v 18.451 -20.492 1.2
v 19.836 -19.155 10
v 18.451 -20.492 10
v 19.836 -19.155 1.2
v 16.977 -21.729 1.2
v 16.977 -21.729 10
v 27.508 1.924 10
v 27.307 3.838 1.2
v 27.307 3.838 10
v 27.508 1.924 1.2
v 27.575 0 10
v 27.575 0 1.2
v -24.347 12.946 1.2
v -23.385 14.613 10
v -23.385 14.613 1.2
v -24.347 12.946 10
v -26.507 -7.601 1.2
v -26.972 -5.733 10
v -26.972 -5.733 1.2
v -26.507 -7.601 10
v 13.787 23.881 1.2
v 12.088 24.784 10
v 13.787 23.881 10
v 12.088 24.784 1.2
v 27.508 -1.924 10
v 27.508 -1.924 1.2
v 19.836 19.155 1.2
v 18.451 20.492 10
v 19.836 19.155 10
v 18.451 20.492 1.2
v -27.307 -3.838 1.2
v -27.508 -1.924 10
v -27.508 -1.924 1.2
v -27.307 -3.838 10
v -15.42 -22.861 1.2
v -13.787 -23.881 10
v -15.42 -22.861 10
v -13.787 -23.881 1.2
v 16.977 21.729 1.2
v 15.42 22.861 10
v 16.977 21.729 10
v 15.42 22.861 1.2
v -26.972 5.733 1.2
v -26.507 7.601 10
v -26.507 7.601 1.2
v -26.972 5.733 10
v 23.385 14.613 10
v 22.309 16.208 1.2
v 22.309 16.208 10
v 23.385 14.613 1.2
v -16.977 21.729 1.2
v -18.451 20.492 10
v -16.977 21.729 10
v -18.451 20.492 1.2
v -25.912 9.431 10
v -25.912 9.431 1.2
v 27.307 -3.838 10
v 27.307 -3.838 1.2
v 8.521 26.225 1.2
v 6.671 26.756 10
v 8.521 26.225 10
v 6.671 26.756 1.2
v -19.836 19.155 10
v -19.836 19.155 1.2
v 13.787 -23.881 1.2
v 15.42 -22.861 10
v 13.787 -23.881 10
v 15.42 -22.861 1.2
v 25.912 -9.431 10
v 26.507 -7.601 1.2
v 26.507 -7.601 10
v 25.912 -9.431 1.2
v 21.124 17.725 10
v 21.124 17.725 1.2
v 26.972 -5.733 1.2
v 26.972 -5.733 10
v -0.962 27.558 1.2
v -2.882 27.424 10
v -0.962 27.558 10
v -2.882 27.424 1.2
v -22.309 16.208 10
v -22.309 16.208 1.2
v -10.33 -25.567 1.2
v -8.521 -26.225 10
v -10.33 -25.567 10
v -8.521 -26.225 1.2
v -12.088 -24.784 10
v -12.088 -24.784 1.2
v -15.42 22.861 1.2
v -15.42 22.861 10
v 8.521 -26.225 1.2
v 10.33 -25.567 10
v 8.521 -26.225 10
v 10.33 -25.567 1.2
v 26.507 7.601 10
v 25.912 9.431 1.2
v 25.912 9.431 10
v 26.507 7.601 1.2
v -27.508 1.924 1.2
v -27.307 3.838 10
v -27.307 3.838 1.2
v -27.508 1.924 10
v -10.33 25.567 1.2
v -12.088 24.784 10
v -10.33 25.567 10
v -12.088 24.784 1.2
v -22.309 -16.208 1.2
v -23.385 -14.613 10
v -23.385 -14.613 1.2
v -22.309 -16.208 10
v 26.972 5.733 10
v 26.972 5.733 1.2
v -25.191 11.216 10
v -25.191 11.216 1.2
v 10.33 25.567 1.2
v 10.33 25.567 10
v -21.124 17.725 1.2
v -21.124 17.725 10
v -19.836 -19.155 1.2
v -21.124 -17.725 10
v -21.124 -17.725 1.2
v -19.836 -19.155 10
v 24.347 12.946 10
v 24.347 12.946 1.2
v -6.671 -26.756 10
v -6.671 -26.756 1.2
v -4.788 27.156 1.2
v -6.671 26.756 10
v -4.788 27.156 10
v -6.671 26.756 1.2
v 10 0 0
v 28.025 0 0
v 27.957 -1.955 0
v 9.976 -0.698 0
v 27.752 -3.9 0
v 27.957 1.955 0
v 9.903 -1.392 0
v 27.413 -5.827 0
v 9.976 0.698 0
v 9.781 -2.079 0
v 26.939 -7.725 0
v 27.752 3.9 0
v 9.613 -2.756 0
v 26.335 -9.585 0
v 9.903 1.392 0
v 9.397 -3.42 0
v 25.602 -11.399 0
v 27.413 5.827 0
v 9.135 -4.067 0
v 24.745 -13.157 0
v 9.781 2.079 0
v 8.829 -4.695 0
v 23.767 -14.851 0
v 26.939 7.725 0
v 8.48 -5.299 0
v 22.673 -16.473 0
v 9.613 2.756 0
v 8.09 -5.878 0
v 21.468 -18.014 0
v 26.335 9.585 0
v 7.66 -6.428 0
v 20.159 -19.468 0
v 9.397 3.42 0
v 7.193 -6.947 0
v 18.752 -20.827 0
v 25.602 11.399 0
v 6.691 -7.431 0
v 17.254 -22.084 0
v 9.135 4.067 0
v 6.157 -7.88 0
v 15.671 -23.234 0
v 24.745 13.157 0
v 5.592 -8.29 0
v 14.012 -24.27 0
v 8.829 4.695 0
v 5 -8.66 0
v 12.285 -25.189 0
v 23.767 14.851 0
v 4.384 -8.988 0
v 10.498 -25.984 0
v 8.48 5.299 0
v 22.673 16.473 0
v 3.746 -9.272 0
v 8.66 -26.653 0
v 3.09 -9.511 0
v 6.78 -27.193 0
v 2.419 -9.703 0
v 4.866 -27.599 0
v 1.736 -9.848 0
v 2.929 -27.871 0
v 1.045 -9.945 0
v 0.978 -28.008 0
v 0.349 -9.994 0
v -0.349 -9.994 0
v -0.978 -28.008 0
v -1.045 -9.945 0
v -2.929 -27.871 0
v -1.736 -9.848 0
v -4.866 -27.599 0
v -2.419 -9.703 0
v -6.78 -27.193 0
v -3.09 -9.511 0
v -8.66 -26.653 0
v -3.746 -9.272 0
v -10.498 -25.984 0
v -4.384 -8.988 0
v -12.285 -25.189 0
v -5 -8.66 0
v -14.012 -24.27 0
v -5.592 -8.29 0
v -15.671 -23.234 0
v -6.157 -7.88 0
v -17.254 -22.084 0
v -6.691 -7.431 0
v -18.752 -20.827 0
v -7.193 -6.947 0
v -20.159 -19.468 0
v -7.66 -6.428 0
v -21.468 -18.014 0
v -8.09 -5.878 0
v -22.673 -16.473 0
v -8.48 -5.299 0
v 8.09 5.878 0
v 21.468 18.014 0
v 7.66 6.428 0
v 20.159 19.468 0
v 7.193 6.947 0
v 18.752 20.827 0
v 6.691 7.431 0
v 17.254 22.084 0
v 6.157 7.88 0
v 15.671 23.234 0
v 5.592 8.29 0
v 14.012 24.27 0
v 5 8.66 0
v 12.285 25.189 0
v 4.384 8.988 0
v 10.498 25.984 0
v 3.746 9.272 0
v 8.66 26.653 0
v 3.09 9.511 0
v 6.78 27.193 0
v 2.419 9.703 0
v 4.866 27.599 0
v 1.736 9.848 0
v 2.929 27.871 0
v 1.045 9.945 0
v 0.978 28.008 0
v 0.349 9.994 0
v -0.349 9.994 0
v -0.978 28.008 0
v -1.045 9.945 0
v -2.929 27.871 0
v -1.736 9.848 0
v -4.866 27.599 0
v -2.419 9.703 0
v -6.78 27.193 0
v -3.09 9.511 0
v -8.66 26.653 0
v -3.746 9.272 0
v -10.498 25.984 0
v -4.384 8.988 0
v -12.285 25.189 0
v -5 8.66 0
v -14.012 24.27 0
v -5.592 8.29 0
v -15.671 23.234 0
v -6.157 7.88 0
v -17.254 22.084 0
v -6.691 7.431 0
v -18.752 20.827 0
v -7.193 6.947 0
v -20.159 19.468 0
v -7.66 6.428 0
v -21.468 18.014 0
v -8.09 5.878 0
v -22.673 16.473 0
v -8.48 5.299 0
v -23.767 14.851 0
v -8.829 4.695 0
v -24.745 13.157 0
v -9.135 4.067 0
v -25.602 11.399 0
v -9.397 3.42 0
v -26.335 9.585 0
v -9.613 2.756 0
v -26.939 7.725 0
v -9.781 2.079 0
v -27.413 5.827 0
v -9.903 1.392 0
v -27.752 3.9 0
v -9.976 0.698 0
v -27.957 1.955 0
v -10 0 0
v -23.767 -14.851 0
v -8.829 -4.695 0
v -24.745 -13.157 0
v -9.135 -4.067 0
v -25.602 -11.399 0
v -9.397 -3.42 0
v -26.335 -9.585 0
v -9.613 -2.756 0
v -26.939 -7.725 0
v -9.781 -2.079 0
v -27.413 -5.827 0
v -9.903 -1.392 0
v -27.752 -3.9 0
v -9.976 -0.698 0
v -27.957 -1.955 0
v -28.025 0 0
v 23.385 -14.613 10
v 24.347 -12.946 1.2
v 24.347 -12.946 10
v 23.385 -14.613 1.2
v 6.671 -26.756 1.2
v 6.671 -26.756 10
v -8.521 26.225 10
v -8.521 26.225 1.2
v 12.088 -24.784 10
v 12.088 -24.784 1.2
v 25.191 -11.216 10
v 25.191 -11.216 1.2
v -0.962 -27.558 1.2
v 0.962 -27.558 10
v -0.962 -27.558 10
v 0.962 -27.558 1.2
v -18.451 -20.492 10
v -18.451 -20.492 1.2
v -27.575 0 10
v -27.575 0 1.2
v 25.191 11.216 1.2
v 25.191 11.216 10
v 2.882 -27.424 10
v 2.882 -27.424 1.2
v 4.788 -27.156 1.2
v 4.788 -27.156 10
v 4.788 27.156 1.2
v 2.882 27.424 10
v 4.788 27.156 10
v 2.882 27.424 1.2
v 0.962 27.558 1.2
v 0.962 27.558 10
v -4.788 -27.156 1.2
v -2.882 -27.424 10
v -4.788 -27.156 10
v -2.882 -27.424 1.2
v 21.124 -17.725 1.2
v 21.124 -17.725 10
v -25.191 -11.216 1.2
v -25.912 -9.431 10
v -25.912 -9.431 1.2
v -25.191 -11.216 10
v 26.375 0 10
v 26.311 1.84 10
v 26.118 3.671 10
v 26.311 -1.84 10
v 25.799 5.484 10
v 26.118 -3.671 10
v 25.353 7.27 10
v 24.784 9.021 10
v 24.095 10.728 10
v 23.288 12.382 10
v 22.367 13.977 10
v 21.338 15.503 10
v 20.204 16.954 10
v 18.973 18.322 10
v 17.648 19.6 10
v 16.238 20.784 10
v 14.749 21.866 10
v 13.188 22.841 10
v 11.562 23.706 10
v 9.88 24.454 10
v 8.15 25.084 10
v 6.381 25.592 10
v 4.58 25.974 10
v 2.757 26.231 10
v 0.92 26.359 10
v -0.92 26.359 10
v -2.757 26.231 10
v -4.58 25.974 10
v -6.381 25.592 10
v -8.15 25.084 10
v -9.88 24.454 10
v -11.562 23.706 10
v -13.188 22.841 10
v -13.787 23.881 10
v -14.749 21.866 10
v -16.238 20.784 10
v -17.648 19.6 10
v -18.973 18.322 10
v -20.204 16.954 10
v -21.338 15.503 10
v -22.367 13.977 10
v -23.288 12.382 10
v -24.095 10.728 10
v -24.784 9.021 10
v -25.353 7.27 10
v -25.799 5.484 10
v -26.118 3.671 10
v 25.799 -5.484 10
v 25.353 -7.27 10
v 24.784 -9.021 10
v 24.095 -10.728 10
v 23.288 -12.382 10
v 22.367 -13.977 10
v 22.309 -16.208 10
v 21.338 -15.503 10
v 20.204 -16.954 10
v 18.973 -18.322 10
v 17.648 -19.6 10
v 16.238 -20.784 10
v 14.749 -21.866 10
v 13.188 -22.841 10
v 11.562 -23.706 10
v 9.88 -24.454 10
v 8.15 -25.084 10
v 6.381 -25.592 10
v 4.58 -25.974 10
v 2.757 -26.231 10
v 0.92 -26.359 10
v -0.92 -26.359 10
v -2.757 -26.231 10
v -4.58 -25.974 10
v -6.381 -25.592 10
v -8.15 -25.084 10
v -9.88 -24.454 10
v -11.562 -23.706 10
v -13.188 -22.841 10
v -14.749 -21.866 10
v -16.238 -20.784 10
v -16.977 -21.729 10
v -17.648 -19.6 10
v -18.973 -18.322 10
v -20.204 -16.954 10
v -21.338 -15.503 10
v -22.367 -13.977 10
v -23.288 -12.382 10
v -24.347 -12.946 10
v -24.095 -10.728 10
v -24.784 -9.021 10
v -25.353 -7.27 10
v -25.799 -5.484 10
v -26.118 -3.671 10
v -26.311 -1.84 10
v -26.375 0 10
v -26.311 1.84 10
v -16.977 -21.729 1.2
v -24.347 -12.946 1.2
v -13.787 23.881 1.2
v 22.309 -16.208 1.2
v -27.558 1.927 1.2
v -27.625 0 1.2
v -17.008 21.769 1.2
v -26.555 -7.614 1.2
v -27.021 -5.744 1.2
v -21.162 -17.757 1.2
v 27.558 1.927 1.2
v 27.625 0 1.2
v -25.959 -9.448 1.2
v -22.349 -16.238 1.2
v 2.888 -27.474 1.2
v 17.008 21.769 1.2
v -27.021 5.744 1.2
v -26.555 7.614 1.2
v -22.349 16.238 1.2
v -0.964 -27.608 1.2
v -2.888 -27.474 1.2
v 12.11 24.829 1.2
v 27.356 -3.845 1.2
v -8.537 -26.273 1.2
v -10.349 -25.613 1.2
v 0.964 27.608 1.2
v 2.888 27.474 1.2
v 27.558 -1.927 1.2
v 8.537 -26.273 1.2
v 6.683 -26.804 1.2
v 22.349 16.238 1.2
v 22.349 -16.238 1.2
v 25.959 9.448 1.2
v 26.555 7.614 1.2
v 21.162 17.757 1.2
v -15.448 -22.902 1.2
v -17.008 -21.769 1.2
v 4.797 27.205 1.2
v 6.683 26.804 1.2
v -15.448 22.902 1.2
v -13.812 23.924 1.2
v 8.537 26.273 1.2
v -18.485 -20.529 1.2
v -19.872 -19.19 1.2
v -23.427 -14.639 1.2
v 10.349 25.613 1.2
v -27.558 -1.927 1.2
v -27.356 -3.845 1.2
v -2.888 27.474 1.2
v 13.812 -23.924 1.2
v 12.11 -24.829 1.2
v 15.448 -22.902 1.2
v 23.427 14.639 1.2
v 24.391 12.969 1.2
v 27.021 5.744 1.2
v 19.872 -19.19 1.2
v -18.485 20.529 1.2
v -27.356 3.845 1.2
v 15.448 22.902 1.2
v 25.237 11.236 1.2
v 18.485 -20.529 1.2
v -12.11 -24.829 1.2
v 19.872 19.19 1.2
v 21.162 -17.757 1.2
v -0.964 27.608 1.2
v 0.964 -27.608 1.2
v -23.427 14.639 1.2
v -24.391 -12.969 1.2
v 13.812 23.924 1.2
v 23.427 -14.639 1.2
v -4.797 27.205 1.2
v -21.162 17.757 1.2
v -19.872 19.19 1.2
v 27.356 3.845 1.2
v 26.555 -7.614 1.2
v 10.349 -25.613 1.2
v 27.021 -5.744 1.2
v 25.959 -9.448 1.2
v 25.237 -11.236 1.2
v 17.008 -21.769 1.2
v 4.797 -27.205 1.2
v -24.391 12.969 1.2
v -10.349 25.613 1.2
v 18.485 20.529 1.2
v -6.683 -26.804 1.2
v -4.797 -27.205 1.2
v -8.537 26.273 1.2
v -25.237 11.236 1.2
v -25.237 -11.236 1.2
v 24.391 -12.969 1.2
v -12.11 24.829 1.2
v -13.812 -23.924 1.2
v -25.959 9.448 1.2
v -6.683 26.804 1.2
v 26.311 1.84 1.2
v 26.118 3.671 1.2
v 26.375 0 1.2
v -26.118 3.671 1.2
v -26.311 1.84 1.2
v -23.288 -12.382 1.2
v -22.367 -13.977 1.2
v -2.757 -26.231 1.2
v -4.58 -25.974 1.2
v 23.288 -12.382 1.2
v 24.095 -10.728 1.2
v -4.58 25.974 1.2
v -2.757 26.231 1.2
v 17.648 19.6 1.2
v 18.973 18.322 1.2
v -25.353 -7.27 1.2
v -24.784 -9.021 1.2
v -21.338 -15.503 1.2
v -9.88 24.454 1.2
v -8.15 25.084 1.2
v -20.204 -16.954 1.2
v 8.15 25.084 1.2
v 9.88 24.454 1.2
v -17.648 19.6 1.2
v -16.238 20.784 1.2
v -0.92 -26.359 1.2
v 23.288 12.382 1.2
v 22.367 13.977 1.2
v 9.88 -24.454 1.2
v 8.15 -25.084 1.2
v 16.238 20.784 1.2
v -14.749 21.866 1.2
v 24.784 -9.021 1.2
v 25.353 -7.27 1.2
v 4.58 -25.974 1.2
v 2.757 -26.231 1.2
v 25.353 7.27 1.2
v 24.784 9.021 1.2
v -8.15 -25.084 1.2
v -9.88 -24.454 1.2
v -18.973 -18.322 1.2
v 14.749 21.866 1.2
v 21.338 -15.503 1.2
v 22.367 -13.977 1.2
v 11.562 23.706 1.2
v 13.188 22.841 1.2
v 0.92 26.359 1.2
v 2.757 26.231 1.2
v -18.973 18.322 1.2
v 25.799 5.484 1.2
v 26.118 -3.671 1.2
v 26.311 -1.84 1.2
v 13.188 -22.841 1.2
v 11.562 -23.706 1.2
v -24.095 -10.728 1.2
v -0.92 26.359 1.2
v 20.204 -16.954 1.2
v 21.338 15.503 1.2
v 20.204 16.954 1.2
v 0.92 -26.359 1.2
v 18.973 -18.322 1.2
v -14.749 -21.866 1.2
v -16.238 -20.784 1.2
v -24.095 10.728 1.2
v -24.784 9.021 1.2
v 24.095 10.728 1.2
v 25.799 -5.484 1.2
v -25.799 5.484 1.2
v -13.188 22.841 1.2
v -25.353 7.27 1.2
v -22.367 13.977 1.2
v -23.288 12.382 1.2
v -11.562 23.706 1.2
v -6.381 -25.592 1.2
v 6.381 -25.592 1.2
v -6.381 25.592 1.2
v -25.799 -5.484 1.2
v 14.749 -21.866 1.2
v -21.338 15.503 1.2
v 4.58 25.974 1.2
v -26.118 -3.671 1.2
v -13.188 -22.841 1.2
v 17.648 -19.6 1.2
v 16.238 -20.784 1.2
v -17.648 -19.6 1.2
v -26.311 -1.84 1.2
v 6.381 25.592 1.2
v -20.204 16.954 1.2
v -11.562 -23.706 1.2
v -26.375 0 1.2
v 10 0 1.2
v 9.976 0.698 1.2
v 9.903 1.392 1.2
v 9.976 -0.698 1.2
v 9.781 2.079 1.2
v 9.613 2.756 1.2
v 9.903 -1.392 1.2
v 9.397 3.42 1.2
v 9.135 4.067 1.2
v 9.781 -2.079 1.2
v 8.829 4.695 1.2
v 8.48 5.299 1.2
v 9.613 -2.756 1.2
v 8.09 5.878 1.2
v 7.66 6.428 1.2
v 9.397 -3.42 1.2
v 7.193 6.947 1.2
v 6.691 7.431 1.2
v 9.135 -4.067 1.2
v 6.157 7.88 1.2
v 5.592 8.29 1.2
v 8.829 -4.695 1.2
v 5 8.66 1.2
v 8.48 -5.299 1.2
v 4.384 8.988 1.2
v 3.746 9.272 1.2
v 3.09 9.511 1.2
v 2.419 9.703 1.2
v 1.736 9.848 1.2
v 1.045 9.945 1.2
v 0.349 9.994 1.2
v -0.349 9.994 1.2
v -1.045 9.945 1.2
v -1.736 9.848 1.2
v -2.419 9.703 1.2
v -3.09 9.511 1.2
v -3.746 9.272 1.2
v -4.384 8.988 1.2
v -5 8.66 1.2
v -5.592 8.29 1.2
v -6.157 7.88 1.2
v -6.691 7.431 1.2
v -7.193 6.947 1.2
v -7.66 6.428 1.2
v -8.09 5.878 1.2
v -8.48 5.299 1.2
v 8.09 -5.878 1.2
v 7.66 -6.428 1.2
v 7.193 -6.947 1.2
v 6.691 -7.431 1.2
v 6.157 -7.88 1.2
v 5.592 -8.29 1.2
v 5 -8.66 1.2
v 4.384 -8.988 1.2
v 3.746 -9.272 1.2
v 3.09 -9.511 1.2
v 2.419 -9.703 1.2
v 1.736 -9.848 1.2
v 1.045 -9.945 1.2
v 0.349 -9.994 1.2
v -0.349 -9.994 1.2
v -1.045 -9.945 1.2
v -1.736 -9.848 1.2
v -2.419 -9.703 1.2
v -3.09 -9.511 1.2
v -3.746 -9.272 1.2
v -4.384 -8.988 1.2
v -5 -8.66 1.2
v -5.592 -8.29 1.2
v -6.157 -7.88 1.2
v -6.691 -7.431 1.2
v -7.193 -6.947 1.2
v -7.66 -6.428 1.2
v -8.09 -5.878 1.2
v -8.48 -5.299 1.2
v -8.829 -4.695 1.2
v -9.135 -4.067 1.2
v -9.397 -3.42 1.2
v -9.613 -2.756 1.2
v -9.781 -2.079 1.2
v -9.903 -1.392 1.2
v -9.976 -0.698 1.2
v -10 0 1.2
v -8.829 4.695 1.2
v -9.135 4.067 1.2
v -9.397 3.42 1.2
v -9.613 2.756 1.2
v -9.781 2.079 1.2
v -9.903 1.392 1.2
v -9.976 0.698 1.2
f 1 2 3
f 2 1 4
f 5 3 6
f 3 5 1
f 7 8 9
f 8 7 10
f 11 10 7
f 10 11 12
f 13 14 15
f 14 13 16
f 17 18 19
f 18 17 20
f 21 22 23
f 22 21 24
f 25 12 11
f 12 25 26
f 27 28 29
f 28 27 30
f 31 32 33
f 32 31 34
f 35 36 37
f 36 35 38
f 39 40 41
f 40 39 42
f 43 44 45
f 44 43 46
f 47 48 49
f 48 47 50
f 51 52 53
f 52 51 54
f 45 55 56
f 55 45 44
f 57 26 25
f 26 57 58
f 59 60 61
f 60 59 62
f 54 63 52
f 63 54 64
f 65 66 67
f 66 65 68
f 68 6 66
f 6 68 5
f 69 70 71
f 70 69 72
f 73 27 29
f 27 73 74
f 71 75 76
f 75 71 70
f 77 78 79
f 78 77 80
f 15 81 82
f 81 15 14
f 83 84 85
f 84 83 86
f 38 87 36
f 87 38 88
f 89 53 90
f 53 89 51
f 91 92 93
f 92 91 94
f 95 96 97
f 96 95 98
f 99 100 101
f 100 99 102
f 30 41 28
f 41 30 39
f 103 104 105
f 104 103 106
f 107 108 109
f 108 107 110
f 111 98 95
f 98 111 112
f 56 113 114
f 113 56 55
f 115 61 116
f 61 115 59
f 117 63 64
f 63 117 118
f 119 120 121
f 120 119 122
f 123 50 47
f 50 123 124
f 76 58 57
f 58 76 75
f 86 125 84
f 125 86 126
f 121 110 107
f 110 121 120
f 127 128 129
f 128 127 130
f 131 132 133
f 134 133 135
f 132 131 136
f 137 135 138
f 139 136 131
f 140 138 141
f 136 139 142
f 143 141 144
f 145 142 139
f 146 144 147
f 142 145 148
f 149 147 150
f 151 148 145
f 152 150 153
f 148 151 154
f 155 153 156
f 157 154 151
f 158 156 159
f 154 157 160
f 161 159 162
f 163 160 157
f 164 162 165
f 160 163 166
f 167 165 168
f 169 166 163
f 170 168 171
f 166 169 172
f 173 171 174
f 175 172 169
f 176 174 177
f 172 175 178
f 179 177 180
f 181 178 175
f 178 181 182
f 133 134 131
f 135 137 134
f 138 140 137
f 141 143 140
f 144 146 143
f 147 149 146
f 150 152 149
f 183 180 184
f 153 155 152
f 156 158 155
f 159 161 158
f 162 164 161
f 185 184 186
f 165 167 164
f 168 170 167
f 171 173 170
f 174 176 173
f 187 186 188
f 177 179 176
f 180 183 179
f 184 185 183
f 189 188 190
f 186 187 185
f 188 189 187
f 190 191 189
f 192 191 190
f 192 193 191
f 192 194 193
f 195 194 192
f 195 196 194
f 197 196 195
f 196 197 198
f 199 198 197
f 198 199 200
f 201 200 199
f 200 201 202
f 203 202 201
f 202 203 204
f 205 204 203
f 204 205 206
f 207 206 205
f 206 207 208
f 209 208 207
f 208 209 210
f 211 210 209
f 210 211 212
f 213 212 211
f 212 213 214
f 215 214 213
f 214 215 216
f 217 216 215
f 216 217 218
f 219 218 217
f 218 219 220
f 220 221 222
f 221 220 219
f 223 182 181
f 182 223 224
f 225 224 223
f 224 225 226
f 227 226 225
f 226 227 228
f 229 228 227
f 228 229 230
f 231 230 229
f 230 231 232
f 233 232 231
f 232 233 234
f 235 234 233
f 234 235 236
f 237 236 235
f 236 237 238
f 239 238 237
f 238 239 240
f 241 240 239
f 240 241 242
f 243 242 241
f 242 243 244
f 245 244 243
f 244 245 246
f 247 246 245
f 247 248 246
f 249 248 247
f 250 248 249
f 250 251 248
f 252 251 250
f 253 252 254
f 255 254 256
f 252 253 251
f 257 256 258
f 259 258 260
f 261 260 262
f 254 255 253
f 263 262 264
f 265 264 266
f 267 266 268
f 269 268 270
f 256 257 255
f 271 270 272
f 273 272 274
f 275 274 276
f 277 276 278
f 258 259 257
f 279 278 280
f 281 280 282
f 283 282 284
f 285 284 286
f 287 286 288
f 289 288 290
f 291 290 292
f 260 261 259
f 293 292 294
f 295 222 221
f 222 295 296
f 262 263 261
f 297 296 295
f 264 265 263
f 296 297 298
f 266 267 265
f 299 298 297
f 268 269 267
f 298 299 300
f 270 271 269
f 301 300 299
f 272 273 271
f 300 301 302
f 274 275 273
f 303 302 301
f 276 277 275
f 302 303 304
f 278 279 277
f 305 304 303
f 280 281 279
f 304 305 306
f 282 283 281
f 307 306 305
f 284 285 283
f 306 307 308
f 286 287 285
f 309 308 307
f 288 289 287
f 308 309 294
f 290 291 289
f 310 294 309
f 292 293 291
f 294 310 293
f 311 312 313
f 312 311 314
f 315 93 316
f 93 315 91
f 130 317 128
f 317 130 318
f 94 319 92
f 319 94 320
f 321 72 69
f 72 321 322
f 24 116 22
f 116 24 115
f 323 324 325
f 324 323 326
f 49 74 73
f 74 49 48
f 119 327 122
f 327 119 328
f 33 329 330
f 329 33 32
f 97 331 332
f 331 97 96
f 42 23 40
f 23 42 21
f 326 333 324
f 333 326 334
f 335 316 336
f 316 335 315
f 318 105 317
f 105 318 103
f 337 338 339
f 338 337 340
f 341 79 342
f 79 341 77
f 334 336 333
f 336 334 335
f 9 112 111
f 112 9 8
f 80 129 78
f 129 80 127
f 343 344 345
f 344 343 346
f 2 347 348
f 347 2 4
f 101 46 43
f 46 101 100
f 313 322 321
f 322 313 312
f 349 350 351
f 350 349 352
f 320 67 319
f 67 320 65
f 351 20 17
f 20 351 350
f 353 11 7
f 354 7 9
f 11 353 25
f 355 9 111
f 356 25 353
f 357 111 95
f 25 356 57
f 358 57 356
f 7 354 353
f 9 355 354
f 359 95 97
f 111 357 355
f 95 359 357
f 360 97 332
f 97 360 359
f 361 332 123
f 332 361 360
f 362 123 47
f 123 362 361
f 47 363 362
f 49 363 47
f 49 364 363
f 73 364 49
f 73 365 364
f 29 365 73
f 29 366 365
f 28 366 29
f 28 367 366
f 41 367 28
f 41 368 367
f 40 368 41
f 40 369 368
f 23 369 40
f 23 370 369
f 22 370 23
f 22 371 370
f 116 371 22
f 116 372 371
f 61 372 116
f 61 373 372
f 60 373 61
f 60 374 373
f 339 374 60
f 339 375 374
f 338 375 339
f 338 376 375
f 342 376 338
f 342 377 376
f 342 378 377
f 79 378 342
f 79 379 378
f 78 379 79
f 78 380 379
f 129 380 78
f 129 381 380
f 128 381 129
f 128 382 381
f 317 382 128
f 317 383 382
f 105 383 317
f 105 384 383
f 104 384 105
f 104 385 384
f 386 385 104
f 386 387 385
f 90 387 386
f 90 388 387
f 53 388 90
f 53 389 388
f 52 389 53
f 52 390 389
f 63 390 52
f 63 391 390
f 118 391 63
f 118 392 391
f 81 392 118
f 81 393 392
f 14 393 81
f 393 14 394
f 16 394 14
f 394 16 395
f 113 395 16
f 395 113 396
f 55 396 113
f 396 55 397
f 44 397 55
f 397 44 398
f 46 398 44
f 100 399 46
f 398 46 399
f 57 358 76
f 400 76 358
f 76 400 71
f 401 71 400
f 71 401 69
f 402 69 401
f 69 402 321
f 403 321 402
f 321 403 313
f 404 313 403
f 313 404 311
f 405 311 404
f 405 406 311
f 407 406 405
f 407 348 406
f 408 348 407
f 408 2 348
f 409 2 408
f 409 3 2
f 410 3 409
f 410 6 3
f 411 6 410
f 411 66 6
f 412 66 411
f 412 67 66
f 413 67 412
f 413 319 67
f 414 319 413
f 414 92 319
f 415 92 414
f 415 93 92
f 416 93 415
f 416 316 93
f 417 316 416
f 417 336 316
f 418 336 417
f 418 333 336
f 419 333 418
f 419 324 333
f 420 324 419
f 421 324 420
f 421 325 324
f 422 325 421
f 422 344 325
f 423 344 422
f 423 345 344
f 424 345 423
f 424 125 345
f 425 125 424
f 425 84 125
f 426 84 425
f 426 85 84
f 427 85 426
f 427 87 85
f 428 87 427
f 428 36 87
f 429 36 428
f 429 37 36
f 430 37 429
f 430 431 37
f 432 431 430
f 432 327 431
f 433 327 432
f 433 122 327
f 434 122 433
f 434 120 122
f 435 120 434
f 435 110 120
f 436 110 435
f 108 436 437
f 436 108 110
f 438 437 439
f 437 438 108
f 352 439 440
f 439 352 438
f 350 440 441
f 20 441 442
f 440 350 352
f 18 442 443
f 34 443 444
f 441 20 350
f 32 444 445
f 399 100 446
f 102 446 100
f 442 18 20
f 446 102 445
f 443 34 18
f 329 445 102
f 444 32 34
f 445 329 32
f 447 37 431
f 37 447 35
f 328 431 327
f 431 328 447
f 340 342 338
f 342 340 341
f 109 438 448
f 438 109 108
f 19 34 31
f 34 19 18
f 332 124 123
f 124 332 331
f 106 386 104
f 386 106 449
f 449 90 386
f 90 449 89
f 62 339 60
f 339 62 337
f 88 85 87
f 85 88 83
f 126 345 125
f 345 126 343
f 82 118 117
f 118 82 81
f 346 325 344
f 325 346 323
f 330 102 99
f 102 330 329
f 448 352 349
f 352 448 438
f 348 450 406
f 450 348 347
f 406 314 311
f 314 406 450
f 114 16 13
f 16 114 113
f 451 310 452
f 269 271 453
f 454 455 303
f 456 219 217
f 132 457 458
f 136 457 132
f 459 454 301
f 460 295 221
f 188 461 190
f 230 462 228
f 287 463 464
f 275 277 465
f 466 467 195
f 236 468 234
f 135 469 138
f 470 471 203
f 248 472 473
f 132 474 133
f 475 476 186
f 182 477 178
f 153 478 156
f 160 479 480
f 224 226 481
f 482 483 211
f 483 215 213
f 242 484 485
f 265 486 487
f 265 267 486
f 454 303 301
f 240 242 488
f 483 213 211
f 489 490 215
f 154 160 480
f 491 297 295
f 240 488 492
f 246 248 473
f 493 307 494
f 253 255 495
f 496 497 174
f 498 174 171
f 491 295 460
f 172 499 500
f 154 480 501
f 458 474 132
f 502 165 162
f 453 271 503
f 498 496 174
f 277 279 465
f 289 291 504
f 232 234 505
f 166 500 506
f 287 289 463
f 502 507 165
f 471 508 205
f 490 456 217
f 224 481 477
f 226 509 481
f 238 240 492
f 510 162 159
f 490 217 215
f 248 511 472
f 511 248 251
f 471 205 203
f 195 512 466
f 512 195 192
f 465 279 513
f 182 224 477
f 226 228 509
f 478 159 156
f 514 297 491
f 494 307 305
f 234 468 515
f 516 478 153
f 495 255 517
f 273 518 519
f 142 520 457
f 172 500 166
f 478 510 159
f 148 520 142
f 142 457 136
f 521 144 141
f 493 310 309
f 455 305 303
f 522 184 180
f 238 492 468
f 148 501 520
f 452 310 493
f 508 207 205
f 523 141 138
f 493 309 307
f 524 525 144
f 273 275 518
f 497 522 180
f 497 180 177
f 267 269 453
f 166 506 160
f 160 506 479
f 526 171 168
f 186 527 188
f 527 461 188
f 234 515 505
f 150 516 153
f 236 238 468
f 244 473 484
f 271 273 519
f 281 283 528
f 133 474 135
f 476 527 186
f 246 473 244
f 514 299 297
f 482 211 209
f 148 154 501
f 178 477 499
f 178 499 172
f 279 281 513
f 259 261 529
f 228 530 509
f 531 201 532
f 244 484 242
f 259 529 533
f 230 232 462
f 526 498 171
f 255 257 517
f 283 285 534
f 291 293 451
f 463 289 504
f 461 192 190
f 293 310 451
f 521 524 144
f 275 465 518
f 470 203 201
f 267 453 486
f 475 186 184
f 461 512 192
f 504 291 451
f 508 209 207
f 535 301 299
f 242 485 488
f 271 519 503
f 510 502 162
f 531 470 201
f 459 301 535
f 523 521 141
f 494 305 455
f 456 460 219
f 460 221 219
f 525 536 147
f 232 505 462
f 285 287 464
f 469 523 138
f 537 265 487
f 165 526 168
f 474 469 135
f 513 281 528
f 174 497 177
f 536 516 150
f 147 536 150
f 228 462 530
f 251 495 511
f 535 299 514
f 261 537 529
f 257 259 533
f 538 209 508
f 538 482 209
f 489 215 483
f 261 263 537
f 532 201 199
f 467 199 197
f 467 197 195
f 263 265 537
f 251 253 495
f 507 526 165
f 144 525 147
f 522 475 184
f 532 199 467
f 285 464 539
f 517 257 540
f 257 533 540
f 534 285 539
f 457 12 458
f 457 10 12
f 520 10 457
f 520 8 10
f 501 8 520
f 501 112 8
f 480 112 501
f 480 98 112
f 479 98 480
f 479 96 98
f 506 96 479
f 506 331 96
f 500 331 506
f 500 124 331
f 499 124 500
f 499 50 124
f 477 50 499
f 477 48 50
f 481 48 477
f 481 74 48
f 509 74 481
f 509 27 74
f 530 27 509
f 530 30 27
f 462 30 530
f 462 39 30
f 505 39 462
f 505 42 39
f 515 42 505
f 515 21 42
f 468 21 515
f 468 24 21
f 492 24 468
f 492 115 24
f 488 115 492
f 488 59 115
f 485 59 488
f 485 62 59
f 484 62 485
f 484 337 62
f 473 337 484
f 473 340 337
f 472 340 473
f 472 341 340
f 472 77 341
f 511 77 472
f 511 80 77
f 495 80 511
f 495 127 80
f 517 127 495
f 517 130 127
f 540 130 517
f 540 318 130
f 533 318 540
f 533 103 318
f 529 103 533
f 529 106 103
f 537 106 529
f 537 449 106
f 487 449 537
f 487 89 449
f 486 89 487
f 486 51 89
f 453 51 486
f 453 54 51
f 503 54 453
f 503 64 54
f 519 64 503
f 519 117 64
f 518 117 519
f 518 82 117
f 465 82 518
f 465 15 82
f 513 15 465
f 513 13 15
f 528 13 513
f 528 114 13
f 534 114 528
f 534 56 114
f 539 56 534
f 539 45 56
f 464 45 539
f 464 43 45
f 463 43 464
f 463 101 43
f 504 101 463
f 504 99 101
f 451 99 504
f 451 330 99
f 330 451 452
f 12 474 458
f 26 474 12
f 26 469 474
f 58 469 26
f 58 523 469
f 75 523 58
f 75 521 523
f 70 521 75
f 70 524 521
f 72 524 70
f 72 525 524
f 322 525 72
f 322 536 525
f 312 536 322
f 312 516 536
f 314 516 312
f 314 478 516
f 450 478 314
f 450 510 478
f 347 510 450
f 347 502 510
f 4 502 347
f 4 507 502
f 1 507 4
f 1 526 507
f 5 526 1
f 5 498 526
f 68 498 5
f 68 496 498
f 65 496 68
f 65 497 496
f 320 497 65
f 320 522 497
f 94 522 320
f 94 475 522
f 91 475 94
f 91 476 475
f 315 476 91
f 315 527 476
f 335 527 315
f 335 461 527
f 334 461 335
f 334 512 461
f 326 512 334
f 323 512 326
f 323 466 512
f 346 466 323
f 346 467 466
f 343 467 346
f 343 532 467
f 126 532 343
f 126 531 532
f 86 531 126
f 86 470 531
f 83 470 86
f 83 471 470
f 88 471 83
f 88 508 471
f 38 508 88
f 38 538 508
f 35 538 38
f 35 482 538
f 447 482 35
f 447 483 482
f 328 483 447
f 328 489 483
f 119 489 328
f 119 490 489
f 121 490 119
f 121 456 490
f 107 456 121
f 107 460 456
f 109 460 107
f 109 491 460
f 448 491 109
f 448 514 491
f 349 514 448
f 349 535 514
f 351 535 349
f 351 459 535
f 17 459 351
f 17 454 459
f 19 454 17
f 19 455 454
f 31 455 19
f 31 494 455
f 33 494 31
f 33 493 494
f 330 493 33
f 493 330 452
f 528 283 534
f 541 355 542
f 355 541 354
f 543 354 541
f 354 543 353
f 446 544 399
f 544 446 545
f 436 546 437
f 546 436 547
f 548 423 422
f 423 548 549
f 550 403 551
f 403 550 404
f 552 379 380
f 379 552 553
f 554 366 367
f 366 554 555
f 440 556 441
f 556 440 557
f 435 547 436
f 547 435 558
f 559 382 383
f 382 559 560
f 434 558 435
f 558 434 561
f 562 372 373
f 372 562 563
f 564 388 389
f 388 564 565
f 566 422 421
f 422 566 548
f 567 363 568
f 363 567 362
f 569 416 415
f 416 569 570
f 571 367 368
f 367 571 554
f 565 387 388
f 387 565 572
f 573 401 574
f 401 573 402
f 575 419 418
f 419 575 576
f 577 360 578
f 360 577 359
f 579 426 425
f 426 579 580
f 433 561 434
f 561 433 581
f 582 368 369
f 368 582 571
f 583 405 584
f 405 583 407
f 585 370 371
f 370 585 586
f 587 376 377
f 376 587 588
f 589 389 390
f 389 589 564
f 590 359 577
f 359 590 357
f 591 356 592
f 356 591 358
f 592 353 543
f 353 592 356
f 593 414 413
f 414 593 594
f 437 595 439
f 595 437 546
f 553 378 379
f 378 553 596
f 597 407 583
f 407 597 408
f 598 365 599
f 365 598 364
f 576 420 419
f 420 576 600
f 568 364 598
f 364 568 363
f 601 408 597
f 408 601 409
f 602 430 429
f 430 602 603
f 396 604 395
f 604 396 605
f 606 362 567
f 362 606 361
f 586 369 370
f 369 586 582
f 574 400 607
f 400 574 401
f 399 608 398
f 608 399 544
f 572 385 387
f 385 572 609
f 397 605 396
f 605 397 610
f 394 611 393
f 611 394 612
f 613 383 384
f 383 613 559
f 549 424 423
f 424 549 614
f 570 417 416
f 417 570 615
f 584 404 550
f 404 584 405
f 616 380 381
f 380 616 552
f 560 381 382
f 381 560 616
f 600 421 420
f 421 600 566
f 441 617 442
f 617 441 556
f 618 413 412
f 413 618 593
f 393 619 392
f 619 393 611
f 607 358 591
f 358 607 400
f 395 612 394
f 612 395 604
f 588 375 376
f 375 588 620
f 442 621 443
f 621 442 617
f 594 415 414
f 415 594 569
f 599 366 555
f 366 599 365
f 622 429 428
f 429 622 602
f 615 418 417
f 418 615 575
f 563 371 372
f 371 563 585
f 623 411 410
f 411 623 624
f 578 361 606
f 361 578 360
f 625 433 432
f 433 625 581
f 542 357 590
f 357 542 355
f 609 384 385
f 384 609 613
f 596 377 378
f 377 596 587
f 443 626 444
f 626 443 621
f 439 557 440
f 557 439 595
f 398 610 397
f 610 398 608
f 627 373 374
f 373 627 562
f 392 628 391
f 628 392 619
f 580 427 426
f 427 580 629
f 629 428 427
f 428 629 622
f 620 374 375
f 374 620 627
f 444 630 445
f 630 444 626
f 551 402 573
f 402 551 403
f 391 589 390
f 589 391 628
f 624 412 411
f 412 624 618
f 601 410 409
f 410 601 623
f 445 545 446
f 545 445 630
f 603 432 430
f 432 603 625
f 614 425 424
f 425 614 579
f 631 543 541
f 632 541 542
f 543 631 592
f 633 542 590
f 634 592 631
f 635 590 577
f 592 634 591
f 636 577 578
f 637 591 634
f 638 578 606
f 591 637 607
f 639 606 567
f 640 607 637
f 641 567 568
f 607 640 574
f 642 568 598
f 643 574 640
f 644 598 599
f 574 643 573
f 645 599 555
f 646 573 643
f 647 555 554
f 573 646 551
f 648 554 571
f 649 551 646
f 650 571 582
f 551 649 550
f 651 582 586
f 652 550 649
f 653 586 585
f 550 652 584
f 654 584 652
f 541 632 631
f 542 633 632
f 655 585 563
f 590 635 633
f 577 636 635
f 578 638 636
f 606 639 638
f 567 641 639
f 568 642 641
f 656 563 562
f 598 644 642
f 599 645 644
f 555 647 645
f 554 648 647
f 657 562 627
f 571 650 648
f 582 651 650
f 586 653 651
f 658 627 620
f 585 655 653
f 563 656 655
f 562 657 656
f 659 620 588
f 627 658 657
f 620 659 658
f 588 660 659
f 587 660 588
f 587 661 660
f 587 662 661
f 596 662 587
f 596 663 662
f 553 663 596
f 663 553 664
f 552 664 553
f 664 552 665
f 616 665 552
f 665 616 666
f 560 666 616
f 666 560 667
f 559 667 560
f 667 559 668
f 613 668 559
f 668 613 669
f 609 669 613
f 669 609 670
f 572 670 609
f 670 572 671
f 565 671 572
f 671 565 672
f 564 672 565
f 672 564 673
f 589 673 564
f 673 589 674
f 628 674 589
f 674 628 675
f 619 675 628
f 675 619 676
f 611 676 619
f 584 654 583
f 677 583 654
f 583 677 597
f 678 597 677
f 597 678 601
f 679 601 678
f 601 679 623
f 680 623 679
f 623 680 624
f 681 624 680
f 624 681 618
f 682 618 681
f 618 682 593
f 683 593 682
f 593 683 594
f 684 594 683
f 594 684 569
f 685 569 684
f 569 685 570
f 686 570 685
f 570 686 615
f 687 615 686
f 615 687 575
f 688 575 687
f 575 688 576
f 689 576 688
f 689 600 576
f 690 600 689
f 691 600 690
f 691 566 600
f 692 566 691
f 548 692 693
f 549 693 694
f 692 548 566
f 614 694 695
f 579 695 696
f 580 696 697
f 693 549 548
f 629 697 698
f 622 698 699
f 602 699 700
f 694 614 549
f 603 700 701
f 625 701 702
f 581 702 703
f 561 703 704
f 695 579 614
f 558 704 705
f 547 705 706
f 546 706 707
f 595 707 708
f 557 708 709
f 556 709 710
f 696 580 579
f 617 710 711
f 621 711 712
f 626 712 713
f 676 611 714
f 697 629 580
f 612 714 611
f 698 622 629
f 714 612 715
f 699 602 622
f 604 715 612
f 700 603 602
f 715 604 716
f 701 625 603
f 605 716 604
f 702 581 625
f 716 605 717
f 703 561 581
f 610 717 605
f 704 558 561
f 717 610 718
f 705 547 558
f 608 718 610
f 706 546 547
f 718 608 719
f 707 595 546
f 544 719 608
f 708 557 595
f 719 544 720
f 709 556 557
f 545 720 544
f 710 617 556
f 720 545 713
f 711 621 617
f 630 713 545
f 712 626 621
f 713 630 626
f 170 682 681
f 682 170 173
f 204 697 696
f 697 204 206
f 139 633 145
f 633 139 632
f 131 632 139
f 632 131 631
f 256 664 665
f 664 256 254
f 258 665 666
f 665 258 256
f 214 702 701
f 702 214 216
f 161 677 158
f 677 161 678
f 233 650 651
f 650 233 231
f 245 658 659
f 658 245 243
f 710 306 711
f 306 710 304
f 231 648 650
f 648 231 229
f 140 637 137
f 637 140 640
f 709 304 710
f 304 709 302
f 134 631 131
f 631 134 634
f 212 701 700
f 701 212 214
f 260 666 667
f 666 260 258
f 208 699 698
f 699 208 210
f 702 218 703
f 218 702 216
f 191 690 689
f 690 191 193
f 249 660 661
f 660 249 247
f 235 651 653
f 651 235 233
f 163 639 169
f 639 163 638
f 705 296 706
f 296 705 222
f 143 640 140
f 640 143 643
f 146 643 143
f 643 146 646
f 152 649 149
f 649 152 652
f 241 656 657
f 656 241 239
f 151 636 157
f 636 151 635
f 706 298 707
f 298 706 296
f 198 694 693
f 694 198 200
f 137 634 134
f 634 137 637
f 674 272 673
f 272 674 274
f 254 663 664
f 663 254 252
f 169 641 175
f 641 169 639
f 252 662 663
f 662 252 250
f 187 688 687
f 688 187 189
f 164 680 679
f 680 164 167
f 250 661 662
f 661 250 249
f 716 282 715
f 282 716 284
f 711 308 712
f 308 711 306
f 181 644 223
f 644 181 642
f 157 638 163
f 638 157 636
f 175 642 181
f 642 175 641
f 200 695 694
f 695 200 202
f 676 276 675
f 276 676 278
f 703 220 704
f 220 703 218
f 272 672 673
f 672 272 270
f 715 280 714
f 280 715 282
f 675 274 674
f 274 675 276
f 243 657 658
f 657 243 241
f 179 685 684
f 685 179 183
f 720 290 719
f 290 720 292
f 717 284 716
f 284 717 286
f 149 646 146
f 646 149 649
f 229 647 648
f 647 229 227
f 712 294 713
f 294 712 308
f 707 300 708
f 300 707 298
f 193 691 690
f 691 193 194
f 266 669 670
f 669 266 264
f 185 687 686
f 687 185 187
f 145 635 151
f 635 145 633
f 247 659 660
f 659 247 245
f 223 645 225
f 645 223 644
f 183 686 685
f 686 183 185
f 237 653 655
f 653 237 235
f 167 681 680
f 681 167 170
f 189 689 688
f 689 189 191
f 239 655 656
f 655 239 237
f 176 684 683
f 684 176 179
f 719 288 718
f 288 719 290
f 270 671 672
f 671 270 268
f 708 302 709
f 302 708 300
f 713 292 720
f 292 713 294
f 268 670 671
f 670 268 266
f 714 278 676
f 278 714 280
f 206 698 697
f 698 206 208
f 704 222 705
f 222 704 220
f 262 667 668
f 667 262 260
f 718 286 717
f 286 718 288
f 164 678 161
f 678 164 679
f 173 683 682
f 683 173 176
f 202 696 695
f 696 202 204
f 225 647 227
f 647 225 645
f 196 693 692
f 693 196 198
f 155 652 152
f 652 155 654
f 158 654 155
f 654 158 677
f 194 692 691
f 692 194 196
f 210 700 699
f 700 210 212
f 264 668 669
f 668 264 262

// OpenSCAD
// file: _common.scad
$fa=4; // default minimum facet angle is now 0.5
$fs=0.05; // default minimum facet size is now 0.05 mm

innerRad = 80/2;
outerRad = 199/2;
depth = 60;
height = 61.5;

m3TapRad = 1.3;
screwHoleXDistance = 4;
screwHoleYDistance = 8.25;

detentRad = 3.3/2;

wallThickness = 1.2;

fingerHoleRad = 10;

holeRad = 55.25/2;
holeRadOffset = .05;

dowelRad = 12.25 / 2;
// main file
include <_common.scad>;

difference() {
  union() {
    cylinder(r = holeRad - holeRadOffset, h = 10);
    cylinder(r1 = holeRad + wallThickness / 3, r2 = holeRad, h = wallThickness);
  }
  translate([0, 0, wallThickness]) cylinder(r = holeRad - holeRadOffset - wallThickness, h = 10);
  translate([0, 0, -.01]) cylinder(r = fingerHoleRad, h = wallThickness + .02);
}
